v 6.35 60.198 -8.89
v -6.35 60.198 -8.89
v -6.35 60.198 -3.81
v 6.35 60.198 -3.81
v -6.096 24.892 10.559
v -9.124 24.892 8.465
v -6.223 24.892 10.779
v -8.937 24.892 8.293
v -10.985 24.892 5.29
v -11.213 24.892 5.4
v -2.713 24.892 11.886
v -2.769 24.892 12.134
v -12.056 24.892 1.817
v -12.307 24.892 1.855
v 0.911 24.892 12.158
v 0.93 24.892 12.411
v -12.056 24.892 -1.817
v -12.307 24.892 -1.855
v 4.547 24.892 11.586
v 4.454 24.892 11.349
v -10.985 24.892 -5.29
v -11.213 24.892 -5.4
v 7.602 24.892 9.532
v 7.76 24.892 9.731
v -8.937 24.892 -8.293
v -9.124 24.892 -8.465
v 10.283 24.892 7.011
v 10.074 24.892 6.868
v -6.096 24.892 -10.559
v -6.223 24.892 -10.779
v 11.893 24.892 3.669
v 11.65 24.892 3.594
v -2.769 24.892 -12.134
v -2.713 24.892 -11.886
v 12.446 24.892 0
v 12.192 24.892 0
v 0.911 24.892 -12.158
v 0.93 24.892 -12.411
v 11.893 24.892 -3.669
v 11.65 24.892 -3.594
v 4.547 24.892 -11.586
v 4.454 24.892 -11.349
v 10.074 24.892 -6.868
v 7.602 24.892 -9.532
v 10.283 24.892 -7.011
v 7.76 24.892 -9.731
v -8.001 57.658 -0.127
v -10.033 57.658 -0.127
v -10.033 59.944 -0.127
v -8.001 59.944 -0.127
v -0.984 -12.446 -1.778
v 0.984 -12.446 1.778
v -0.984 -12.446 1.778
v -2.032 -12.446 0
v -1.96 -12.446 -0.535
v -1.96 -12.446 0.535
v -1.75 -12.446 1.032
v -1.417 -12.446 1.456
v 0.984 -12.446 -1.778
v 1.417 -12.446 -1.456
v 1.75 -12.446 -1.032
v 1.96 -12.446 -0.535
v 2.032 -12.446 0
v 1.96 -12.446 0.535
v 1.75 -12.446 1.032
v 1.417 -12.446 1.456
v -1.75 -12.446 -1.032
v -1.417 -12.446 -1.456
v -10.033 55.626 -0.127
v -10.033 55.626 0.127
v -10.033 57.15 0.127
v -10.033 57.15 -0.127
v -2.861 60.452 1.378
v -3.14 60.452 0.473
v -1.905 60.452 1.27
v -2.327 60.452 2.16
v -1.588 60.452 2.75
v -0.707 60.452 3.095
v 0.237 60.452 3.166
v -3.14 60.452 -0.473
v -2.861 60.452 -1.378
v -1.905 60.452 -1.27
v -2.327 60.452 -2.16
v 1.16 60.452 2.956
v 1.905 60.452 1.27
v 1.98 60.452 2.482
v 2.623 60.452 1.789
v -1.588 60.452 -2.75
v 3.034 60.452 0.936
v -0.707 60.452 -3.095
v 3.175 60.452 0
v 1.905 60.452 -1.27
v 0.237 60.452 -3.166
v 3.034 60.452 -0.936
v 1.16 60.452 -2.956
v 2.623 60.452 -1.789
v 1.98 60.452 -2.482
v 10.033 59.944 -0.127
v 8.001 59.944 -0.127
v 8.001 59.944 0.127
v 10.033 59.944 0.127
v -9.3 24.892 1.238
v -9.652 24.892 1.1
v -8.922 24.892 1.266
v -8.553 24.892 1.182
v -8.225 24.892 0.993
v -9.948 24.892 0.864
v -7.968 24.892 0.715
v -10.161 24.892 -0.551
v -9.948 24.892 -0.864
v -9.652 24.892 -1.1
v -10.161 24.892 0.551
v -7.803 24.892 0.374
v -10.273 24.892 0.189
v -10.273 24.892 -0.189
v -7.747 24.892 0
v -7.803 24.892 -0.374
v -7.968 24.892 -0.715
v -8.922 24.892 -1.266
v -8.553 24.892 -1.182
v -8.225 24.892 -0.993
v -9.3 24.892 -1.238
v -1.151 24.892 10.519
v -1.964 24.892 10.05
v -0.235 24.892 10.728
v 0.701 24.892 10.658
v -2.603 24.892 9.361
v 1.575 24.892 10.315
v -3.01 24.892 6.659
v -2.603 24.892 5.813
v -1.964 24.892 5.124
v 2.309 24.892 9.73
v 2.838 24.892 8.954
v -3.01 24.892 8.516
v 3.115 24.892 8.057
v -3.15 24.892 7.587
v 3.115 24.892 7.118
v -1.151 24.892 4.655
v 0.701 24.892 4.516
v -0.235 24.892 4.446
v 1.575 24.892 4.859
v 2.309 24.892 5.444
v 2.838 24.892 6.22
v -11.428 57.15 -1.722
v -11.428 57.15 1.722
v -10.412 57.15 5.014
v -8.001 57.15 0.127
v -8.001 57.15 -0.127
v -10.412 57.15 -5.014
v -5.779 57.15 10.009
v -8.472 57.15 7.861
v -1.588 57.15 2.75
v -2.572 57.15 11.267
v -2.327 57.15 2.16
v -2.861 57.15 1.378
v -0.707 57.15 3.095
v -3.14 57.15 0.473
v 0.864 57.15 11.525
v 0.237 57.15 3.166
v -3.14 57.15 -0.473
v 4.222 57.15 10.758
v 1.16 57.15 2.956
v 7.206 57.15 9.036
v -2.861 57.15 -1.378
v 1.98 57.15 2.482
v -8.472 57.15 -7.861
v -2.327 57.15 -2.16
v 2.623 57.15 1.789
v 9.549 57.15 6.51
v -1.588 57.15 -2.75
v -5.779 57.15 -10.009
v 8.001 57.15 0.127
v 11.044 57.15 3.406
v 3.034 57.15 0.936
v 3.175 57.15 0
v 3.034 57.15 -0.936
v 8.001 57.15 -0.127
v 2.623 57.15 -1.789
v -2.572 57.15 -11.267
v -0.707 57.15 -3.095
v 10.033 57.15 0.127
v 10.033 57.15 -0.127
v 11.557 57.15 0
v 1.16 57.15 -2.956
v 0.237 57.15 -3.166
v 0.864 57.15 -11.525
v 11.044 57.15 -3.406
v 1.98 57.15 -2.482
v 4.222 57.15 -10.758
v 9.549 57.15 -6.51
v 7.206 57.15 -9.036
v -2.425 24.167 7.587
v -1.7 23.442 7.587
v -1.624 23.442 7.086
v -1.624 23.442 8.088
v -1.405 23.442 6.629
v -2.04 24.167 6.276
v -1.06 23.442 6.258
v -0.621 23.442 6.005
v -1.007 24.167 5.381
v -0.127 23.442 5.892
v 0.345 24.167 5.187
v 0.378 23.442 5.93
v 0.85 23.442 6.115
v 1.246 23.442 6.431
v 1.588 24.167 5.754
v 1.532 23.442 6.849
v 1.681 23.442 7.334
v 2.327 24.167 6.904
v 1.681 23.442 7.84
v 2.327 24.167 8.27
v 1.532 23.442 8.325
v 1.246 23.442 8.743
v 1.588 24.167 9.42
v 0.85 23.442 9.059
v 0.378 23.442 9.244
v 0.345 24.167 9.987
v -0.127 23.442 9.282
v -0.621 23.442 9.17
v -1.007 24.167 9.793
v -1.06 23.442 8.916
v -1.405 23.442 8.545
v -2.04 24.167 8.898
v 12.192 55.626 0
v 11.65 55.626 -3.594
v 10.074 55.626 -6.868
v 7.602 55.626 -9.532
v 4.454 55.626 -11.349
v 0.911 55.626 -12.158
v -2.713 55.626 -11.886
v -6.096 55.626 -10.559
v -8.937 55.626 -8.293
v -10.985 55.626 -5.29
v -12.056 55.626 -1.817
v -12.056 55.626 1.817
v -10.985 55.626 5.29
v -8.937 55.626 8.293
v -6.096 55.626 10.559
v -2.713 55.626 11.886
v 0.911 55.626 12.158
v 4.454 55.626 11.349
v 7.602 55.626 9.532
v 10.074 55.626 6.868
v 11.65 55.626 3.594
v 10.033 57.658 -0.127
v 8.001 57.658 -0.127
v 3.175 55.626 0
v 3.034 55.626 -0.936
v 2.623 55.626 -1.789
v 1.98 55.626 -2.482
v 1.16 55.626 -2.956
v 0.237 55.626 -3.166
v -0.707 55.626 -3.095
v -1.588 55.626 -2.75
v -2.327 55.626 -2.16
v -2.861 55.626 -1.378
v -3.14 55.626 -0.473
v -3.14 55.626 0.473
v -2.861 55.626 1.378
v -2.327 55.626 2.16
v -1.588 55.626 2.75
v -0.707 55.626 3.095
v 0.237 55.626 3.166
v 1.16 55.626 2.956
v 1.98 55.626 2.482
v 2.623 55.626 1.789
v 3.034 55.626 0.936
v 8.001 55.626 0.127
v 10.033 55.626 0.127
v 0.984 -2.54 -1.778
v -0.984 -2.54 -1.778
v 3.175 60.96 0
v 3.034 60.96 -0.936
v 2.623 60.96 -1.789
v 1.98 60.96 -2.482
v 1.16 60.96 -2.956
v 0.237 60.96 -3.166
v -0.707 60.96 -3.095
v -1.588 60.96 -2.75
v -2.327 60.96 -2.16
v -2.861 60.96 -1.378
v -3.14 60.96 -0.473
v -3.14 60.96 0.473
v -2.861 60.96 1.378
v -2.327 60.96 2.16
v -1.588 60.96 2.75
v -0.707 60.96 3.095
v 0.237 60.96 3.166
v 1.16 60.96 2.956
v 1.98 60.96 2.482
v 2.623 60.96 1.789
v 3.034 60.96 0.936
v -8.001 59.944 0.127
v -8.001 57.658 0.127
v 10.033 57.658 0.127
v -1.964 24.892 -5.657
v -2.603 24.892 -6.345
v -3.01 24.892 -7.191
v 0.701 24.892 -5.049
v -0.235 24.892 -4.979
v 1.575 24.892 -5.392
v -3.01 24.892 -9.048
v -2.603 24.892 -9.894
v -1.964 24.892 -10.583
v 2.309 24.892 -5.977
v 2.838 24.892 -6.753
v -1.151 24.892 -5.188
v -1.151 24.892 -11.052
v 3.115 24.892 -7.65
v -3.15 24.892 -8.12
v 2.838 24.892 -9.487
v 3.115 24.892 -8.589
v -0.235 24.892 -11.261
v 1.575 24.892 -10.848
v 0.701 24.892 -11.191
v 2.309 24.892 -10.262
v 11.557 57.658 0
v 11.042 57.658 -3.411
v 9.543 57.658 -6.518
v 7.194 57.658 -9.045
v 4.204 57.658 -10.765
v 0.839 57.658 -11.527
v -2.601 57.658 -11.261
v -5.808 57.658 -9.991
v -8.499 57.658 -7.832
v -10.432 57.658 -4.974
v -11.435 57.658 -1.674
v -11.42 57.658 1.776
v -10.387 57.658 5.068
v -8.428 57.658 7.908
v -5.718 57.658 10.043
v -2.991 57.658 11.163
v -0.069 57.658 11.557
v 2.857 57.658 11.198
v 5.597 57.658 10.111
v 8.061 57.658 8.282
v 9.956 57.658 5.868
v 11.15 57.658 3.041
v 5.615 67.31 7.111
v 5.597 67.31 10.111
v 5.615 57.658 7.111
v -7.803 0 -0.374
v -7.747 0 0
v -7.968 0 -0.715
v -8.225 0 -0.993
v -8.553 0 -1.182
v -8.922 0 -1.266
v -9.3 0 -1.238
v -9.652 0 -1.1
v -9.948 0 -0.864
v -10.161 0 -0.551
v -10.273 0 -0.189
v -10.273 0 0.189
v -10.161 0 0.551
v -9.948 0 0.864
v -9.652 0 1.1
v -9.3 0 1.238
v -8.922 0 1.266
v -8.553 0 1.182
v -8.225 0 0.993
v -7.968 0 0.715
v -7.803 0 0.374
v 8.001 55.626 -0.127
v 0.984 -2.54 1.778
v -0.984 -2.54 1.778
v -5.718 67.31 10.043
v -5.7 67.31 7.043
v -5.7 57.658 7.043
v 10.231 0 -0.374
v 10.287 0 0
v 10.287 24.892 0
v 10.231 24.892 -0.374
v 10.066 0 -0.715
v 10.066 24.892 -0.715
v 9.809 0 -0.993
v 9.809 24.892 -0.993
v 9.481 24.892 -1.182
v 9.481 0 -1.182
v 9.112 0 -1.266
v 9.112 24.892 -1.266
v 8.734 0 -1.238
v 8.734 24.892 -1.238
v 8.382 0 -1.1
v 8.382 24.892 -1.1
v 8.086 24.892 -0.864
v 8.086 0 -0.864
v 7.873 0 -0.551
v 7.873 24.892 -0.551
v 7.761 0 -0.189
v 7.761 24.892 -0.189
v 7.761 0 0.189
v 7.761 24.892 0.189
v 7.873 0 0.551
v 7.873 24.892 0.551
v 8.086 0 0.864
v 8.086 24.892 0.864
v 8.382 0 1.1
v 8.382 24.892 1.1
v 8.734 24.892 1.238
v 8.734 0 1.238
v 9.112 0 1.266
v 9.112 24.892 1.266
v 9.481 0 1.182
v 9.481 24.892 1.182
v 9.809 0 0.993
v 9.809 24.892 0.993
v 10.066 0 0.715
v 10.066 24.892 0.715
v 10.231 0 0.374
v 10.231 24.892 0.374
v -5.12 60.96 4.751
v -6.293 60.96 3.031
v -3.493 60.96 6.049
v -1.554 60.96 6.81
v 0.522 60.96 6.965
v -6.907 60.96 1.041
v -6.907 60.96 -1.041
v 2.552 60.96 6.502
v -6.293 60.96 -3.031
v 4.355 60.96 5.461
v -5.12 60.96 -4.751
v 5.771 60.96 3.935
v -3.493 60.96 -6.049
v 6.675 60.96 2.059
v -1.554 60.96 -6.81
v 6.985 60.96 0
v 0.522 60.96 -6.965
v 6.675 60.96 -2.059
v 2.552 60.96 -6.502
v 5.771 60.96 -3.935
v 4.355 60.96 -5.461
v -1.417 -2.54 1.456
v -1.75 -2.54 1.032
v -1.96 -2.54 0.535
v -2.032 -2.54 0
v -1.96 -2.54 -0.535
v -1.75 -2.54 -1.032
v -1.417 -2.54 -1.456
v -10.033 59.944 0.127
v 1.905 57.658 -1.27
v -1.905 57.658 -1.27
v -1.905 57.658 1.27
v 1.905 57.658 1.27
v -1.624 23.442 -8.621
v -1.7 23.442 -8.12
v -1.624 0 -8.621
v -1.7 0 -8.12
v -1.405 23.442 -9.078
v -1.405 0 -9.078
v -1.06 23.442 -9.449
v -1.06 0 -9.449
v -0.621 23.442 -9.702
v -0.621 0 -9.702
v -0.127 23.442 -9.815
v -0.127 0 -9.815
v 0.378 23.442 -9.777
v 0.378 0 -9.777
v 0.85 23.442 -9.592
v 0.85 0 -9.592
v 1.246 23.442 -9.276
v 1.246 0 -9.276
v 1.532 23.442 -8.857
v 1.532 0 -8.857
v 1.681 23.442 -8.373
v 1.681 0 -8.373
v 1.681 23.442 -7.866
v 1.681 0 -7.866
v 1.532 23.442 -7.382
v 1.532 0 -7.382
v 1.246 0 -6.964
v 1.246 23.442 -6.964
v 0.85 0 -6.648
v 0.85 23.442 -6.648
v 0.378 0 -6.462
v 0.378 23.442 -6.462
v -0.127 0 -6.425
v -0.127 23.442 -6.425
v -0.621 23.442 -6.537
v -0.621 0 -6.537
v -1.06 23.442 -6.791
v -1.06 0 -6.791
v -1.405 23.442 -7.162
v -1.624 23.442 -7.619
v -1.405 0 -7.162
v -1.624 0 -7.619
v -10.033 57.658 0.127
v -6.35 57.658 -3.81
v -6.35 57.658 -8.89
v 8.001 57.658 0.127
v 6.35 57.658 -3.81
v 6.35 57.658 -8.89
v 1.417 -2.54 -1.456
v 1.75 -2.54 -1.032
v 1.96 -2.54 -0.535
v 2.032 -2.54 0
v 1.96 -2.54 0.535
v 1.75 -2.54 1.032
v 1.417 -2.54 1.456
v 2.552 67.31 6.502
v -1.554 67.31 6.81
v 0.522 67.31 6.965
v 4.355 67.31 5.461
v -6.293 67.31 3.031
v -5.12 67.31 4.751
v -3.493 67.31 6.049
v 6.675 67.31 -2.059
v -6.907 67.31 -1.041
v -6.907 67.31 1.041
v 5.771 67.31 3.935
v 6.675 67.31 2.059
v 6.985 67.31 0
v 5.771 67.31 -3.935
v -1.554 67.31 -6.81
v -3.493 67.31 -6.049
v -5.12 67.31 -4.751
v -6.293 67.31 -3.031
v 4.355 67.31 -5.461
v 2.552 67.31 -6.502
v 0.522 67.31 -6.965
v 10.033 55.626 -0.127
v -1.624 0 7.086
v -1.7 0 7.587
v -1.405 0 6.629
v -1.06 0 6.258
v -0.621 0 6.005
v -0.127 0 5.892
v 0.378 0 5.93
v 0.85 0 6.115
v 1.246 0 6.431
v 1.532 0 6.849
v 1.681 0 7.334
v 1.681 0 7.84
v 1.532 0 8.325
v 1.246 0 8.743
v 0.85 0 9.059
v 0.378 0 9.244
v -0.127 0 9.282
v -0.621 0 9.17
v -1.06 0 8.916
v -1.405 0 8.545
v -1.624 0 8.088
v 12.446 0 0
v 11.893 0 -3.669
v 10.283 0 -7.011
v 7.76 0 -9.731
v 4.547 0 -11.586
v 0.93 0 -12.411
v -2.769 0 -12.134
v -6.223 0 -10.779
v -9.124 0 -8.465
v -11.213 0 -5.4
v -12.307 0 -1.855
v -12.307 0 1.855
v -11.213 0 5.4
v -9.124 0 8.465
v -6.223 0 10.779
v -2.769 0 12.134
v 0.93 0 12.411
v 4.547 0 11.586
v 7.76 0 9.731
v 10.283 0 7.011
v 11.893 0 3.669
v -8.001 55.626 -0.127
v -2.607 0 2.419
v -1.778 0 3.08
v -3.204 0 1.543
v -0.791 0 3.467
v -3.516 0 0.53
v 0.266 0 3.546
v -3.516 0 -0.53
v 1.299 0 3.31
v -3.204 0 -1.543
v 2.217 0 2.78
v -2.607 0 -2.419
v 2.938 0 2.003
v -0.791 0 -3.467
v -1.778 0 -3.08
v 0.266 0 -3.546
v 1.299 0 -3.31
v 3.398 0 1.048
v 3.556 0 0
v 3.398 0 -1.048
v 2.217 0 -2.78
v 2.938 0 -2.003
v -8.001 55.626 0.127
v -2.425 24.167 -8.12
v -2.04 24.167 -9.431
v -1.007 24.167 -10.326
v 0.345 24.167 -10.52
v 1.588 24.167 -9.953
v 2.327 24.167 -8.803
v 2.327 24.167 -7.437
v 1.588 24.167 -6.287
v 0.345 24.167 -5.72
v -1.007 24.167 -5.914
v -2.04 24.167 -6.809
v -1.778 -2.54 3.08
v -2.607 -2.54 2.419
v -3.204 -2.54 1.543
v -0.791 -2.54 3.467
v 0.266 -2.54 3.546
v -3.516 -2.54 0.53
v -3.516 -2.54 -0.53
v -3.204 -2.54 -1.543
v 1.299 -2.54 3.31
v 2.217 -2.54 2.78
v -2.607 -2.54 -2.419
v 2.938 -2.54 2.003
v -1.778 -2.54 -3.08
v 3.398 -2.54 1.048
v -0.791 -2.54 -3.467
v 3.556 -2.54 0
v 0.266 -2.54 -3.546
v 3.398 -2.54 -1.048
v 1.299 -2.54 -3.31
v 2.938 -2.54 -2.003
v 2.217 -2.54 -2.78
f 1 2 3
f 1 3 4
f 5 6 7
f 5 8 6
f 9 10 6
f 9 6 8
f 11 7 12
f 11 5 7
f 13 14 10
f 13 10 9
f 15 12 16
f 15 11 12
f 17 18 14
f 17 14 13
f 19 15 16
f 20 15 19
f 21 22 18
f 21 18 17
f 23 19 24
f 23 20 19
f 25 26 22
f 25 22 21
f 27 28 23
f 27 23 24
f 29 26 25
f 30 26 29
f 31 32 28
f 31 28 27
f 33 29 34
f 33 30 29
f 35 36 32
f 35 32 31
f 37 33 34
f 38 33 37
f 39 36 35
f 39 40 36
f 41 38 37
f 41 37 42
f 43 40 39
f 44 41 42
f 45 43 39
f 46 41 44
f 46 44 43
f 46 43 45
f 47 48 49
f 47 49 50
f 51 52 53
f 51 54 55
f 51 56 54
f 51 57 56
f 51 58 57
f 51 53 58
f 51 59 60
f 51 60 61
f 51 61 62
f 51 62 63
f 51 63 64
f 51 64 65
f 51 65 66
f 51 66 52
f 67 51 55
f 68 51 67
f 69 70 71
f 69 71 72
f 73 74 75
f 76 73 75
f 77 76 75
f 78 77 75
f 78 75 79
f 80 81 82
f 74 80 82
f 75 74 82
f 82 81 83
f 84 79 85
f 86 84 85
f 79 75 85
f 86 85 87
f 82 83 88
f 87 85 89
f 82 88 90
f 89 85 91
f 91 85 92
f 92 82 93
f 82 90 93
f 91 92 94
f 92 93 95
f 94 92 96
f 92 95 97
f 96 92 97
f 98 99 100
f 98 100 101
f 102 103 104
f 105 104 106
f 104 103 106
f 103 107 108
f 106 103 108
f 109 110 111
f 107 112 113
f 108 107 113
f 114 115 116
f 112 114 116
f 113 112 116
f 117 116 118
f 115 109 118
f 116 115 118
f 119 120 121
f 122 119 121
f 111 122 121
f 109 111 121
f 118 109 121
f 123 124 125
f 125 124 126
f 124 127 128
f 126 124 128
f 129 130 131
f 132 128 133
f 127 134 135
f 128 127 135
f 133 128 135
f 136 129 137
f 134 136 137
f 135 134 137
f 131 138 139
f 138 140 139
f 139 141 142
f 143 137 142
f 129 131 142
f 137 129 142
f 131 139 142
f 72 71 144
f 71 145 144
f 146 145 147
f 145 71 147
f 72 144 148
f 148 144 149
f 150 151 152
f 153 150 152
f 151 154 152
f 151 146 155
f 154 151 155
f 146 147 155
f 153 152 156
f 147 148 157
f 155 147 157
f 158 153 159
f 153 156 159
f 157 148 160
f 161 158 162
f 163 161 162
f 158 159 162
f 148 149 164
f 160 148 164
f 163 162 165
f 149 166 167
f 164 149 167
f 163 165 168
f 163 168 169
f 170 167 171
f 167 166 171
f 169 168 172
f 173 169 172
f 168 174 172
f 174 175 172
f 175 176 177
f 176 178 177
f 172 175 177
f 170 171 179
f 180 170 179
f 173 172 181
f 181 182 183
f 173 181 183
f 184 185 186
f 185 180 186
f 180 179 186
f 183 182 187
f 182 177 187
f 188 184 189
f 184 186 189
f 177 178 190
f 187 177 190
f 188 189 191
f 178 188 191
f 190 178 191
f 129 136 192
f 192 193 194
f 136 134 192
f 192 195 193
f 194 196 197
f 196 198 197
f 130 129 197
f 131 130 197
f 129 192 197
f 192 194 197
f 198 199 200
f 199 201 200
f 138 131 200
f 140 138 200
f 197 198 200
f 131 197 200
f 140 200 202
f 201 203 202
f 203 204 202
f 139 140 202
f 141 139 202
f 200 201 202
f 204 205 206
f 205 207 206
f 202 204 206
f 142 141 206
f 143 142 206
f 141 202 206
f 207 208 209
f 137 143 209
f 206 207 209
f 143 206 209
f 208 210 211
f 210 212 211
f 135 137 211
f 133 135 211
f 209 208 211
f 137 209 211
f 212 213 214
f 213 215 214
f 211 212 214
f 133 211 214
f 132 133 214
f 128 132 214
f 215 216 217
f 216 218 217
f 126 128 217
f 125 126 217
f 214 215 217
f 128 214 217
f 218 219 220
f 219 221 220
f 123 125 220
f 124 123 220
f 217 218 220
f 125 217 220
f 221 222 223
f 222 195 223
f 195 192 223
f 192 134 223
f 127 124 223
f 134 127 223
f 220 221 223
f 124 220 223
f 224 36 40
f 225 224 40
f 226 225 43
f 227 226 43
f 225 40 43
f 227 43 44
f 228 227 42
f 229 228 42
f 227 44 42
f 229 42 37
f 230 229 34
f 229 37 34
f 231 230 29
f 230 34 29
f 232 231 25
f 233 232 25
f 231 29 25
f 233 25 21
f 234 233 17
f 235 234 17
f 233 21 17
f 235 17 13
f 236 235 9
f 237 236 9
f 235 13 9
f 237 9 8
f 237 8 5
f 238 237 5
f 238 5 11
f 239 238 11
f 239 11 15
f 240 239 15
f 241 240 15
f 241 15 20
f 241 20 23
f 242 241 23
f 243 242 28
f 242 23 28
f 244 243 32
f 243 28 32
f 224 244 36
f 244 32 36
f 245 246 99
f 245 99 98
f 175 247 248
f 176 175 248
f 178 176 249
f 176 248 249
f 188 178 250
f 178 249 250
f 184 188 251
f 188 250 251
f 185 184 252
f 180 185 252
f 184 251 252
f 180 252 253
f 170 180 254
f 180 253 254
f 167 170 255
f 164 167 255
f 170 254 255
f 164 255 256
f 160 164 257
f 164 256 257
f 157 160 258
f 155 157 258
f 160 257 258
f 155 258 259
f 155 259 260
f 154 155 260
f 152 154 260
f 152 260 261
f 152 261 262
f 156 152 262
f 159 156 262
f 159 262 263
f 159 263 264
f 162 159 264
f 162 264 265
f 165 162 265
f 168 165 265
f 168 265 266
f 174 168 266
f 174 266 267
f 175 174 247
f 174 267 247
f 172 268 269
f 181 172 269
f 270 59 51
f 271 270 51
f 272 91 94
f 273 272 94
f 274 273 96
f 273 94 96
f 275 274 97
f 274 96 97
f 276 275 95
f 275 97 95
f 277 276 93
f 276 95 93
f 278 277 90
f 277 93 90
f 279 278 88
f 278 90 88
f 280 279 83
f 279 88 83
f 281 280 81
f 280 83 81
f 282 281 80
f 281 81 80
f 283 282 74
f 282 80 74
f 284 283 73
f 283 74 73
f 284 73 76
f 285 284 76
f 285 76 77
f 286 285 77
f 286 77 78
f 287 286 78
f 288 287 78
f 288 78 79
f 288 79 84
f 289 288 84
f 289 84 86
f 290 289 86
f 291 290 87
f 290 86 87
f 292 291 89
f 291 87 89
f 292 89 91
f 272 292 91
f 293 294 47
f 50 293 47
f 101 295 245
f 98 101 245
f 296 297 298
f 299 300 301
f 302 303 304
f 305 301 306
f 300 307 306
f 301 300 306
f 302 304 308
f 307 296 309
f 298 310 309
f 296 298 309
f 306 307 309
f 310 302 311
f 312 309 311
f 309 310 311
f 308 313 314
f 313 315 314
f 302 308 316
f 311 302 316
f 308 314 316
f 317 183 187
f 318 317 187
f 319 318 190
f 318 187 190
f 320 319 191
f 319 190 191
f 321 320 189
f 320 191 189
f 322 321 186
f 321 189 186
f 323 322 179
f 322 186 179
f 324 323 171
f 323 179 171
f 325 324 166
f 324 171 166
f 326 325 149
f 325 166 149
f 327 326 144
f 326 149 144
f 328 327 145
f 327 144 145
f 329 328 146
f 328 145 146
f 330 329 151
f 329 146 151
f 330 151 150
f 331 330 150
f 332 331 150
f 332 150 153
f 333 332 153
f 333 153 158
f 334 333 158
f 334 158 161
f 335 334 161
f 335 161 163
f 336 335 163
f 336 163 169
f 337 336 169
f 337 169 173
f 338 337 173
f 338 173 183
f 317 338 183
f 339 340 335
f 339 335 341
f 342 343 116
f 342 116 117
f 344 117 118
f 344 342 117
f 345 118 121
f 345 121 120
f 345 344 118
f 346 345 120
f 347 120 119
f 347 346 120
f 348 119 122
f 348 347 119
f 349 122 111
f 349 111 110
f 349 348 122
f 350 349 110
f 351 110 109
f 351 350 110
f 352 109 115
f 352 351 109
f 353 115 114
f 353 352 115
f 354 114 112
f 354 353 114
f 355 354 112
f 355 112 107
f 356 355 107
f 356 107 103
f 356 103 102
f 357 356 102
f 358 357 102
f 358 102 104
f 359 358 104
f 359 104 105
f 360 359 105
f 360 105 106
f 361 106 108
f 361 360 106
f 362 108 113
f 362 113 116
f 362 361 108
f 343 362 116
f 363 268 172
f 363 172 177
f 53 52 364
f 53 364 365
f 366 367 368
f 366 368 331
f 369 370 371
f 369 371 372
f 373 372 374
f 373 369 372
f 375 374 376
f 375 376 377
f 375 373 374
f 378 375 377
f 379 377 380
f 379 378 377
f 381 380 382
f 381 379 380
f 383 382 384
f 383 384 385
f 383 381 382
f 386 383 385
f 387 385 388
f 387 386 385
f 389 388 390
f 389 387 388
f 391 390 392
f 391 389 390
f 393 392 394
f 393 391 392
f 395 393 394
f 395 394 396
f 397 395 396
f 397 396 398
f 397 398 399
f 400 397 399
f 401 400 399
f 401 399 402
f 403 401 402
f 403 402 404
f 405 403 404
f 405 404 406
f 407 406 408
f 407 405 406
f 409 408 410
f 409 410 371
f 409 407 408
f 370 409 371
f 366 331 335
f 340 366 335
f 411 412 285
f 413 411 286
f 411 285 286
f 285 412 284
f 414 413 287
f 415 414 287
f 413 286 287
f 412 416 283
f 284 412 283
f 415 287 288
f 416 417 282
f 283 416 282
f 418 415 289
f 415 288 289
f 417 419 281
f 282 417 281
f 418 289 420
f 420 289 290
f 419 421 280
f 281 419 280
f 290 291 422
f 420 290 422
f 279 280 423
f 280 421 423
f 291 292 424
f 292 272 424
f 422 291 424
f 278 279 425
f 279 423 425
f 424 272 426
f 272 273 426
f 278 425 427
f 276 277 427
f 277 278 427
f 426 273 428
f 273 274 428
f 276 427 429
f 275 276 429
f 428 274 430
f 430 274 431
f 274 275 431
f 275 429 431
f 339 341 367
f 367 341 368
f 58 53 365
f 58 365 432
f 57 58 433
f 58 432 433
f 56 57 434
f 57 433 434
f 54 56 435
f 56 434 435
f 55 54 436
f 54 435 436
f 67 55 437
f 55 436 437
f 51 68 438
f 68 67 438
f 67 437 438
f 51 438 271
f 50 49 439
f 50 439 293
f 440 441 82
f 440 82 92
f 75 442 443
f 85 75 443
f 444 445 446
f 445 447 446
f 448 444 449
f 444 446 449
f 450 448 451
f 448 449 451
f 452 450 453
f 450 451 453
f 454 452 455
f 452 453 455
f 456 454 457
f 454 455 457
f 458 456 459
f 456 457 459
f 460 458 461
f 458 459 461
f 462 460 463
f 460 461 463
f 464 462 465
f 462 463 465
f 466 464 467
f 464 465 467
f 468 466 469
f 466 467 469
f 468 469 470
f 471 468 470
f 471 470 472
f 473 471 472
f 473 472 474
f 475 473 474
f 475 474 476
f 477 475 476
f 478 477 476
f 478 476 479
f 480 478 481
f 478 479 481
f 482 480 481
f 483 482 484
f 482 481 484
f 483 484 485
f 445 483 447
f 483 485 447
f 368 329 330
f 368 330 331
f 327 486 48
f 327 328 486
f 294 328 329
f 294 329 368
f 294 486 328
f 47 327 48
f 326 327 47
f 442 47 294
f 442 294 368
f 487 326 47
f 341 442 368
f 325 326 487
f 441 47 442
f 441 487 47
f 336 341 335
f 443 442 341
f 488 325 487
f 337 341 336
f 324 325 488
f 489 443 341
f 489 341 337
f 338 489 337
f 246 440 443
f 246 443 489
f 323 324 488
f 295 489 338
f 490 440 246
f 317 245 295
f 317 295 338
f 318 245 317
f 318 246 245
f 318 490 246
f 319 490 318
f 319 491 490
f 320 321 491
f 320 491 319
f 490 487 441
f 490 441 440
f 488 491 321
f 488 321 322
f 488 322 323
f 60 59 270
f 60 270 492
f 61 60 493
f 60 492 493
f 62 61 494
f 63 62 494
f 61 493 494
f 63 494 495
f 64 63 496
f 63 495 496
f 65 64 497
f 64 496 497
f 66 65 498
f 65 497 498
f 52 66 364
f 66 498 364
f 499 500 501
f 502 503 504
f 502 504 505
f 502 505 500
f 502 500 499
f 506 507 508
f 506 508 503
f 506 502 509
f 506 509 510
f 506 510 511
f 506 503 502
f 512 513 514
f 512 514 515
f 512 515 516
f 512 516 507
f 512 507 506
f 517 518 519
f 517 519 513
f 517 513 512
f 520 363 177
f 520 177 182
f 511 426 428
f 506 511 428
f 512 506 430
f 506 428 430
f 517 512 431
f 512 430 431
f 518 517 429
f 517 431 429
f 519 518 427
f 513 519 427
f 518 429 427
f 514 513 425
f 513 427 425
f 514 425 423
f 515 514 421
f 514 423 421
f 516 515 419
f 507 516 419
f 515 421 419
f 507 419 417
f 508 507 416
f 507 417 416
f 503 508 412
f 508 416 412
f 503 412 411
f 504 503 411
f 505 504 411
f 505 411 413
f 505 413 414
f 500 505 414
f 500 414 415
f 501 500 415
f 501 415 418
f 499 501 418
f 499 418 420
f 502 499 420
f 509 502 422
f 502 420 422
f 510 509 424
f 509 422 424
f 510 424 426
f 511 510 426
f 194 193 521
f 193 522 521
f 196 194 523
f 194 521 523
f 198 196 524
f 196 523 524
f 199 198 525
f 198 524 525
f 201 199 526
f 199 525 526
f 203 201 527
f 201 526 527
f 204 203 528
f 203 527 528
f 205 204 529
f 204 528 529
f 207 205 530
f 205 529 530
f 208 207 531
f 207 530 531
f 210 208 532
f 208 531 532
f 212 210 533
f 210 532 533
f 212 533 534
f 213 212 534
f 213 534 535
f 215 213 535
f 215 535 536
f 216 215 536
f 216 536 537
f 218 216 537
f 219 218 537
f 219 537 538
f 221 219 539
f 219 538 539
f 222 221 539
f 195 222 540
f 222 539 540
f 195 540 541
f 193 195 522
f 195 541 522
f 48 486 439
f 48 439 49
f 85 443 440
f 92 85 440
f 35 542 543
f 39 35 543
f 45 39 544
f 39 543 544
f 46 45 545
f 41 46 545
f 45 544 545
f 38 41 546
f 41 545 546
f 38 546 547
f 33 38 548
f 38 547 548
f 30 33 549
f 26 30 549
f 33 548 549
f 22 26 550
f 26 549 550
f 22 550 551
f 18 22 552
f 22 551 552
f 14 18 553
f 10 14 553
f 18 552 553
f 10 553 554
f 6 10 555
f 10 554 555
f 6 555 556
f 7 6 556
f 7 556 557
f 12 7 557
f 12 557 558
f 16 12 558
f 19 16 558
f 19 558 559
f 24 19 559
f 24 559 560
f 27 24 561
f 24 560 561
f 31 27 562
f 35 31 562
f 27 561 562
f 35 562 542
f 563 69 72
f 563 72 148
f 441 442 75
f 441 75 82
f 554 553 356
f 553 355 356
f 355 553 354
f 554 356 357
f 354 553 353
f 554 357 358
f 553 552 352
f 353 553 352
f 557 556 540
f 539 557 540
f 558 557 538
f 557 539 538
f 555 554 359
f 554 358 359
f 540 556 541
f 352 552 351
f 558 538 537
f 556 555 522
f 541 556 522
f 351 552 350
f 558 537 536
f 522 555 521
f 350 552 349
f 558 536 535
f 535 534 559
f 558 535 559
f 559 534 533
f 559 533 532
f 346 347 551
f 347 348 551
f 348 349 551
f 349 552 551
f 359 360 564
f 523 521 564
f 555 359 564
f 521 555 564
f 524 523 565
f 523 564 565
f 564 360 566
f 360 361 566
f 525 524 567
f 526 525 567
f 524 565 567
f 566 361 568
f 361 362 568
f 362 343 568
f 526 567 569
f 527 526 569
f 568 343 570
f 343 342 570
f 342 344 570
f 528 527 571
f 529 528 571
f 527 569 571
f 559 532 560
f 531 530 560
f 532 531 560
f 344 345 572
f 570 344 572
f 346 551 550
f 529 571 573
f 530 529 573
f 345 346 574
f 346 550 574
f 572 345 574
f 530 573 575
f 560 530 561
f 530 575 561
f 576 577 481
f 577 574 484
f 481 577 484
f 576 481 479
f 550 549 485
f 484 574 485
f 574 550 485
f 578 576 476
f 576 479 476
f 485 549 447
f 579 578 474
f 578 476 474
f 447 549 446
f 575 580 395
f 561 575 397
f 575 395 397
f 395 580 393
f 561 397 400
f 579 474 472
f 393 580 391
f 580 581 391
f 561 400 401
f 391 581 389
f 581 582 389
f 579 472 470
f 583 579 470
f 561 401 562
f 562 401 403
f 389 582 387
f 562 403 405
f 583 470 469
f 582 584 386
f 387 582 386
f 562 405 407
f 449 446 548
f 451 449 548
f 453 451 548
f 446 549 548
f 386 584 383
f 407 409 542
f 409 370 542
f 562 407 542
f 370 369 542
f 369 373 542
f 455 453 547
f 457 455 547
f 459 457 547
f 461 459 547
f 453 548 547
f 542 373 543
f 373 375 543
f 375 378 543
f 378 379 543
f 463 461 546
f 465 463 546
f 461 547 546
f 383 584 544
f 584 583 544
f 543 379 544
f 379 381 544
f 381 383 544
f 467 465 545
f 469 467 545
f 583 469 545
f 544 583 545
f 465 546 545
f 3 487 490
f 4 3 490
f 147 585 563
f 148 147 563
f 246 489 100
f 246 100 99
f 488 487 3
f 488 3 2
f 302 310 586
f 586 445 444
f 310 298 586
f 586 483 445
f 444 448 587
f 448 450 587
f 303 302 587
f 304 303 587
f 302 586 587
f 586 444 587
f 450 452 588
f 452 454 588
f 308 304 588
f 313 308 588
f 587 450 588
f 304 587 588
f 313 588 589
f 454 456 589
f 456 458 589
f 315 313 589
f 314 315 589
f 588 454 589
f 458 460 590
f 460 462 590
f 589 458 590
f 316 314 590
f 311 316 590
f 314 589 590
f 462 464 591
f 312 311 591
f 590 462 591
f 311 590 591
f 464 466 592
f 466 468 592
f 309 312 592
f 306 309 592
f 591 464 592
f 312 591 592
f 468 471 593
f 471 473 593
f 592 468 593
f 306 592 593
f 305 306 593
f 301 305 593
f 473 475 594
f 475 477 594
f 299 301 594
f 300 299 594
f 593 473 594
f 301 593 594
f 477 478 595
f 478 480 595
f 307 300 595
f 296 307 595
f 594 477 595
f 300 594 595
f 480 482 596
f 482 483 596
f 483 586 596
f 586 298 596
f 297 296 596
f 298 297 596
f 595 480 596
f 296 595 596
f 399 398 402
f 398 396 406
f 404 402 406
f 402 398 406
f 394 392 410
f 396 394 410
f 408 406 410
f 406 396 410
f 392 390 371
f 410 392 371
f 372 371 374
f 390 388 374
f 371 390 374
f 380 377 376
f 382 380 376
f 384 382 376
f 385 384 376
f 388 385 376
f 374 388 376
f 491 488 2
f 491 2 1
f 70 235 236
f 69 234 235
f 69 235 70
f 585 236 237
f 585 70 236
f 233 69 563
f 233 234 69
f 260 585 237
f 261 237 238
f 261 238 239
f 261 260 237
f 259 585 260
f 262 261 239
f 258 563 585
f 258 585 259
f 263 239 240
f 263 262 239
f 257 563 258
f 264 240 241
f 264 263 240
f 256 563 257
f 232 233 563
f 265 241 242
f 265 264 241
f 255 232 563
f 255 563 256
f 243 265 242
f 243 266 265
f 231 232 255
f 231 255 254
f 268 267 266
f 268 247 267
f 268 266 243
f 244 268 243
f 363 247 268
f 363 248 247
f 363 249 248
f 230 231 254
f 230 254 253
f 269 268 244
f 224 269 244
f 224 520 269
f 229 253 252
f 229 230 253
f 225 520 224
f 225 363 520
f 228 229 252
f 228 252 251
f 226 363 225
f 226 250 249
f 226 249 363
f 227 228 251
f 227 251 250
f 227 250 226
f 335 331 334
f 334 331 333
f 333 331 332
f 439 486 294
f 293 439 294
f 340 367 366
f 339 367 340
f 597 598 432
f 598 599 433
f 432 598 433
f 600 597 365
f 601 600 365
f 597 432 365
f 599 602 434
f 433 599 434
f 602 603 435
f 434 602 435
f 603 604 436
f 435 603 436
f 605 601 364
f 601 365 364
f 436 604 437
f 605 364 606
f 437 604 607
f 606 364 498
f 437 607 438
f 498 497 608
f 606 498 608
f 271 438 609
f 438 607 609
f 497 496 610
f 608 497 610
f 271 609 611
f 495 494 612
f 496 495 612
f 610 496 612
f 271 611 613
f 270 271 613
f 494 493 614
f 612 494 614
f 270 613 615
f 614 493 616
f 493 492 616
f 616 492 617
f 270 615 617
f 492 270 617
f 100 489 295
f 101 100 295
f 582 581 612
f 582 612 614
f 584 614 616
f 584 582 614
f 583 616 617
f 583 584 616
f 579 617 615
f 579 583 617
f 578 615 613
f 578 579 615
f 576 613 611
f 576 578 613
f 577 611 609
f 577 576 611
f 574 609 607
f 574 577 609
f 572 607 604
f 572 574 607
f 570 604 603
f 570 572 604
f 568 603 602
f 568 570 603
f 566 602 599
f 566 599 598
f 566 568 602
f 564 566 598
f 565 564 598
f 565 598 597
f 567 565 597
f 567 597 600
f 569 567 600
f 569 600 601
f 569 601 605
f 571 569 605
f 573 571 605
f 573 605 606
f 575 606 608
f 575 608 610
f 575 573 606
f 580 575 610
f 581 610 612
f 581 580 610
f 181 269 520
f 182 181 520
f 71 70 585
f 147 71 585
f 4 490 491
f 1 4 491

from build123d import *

# Parameters (mm, degrees)
SKETCH1_R                                       = 12.446
SKETCH1_R_2                                     = 1.27
BOSS_EXTRUDE1_DEPTH                             = 24.892
CSK_FOR_M3_FLAT_HEAD_MACHINE_SCREW1_D           = 3.4
CSK_FOR_M3_FLAT_HEAD_MACHINE_SCREW1_CSINK_D     = 6.3
CSK_FOR_M3_FLAT_HEAD_MACHINE_SCREW1_CSINK_ANGLE = 90
SKETCH5_R                                       = 12.192
BOSS_EXTRUDE2_DEPTH                             = 30.734
SKETCH6_R                                       = 3.556
BOSS_EXTRUDE3_DEPTH                             = 2.54
SKETCH7_R                                       = 2.032
BOSS_EXTRUDE4_DEPTH                             = 9.906
SKETCH8_W                                       = 2.032
SKETCH8_H                                       = 0.254
CUT_EXTRUDE2_DEPTH                              = 9.906
SKETCH9_R                                       = 3.175
BOSS_EXTRUDE5_DEPTH                             = 1.524
SKETCH10_W                                      = 2.032
SKETCH10_H                                      = 0.254
BOSS_EXTRUDE6_DEPTH                             = 4.318
SKETCH11_R                                      = 11.557
SKETCH11_W                                      = 2.032
SKETCH11_H                                      = 0.254
BOSS_EXTRUDE7_DEPTH                             = 0.508
SKETCH12_W                                      = 12.7
SKETCH12_H                                      = 5.08
BOSS_EXTRUDE8_DEPTH                             = 2.54
SKETCH13_W                                      = 3.81
SKETCH13_H                                      = 2.54
BOSS_EXTRUDE9_DEPTH                             = 2.794
BOSS_EXTRUDE10_DEPTH                            = 9.652
SKETCH15_R                                      = 3.175
BOSS_EXTRUDE11_DEPTH                            = 0.508
SKETCH16_R                                      = 6.985
BOSS_EXTRUDE12_DEPTH                            = 6.35


with BuildPart() as part:
    # Sketch1 → Boss-Extrude1 (new body)
    with BuildSketch(Plane(origin=(0, 0, 0), x_dir=(1, 0, 0), z_dir=(0, 1, 0))):
        Circle(SKETCH1_R)
        with Locations((-9.017, 0)):
            Circle(SKETCH1_R_2, mode=Mode.SUBTRACT)
        with Locations((9.017, 0)):
            Circle(SKETCH1_R_2, mode=Mode.SUBTRACT)
    extrude(amount=BOSS_EXTRUDE1_DEPTH)

    # CSK for M3 Flat Head Machine Screw1 (through all)
    with Locations(Plane(origin=(0, 24.892, 0), x_dir=(1, 0, 0), z_dir=(0, 1, 0))):
        with Locations((0, 8.119865968), (0, -7.587036194)):
            CounterSinkHole(CSK_FOR_M3_FLAT_HEAD_MACHINE_SCREW1_D / 2, CSK_FOR_M3_FLAT_HEAD_MACHINE_SCREW1_CSINK_D / 2, counter_sink_angle=CSK_FOR_M3_FLAT_HEAD_MACHINE_SCREW1_CSINK_ANGLE)

    # Sketch5 → Boss-Extrude2 (add)
    with BuildSketch(Plane(origin=(0, 24.892, 0), x_dir=(1, 0, 0), z_dir=(0, 1, 0))):
        Circle(SKETCH5_R)
    extrude(amount=BOSS_EXTRUDE2_DEPTH)

    # Sketch6 → Boss-Extrude3 (add)
    with BuildSketch(Plane(origin=(0, 0, 0), x_dir=(1, 0, 0), z_dir=(0, 1, 0))):
        Circle(SKETCH6_R)
    extrude(amount=-BOSS_EXTRUDE3_DEPTH)

    # Sketch7 → Boss-Extrude4 (add)
    with BuildSketch(Plane(origin=(0, -2.54, 0), x_dir=(-1, 0, 0), z_dir=(0, -1, 0))):
        Circle(SKETCH7_R)
    extrude(amount=BOSS_EXTRUDE4_DEPTH)

    # Sketch8 → Cut-Extrude2 (cut)
    with BuildSketch(Plane(origin=(0, -12.446, 0), x_dir=(-1, 0, 0), z_dir=(0, -1, 0))):
        with Locations((0, -1.905)):
            Rectangle(SKETCH8_W, SKETCH8_H)
        with Locations((0, 1.905)):
            Rectangle(SKETCH8_W, SKETCH8_H)
    extrude(amount=-CUT_EXTRUDE2_DEPTH, mode=Mode.SUBTRACT)

    # Sketch9 → Boss-Extrude5 (add)
    with BuildSketch(Plane(origin=(0, 55.626, 0), x_dir=(1, 0, 0), z_dir=(0, 1, 0))):
        Circle(SKETCH9_R)
    extrude(amount=BOSS_EXTRUDE5_DEPTH)

    # Sketch10 → Boss-Extrude6 (add)
    with BuildSketch(Plane(origin=(0, 55.626, 0), x_dir=(1, 0, 0), z_dir=(0, 1, 0))):
        with Locations((-9.017, 0)):
            Rectangle(SKETCH10_W, SKETCH10_H)
        with Locations((9.017, 0)):
            Rectangle(SKETCH10_W, SKETCH10_H)
    extrude(amount=BOSS_EXTRUDE6_DEPTH)

    # Sketch11 → Boss-Extrude7 (add)
    with BuildSketch(Plane(origin=(0, 57.15, 0), x_dir=(1, 0, 0), z_dir=(0, 1, 0))):
        Circle(SKETCH11_R)
        with Locations((-9.017, 0)):
            Rectangle(SKETCH11_W, SKETCH11_H, mode=Mode.SUBTRACT)
        with Locations((9.017, 0)):
            Rectangle(SKETCH11_W, SKETCH11_H, mode=Mode.SUBTRACT)
    extrude(amount=BOSS_EXTRUDE7_DEPTH)

    # Sketch12 → Boss-Extrude8 (add)
    with BuildSketch(Plane(origin=(0, 57.658, 0), x_dir=(1, 0, 0), z_dir=(0, 1, 0))):
        with Locations((0, 6.35)):
            Rectangle(SKETCH12_W, SKETCH12_H)
    extrude(amount=BOSS_EXTRUDE8_DEPTH)

    # Sketch13 → Boss-Extrude9 (add)
    with BuildSketch(Plane(origin=(0, 57.658, 0), x_dir=(1, 0, 0), z_dir=(0, 1, 0))):
        Rectangle(SKETCH13_W, SKETCH13_H)
    extrude(amount=BOSS_EXTRUDE9_DEPTH)

    # Sketch14 → Boss-Extrude10 (add)
    with BuildSketch(Plane(origin=(0, 57.658, 0), x_dir=(1, 0, 0), z_dir=(0, 1, 0))):
        Polygon((-5.718475067, -10.043071836), (5.597401443, -10.111050692), (5.615425354, -7.110759652), (-5.700451156, -7.042780797), align=None)
    extrude(amount=BOSS_EXTRUDE10_DEPTH)

    # Sketch15 → Boss-Extrude11 (add)
    with BuildSketch(Plane(origin=(0, 60.452, 0), x_dir=(1, 0, 0), z_dir=(0, 1, 0))):
        Circle(SKETCH15_R)
    extrude(amount=BOSS_EXTRUDE11_DEPTH)

    # Sketch16 → Boss-Extrude12 (add)
    with BuildSketch(Plane(origin=(0, 60.96, 0), x_dir=(1, 0, 0), z_dir=(0, 1, 0))):
        Circle(SKETCH16_R)
    extrude(amount=BOSS_EXTRUDE12_DEPTH)


solid = part.part
